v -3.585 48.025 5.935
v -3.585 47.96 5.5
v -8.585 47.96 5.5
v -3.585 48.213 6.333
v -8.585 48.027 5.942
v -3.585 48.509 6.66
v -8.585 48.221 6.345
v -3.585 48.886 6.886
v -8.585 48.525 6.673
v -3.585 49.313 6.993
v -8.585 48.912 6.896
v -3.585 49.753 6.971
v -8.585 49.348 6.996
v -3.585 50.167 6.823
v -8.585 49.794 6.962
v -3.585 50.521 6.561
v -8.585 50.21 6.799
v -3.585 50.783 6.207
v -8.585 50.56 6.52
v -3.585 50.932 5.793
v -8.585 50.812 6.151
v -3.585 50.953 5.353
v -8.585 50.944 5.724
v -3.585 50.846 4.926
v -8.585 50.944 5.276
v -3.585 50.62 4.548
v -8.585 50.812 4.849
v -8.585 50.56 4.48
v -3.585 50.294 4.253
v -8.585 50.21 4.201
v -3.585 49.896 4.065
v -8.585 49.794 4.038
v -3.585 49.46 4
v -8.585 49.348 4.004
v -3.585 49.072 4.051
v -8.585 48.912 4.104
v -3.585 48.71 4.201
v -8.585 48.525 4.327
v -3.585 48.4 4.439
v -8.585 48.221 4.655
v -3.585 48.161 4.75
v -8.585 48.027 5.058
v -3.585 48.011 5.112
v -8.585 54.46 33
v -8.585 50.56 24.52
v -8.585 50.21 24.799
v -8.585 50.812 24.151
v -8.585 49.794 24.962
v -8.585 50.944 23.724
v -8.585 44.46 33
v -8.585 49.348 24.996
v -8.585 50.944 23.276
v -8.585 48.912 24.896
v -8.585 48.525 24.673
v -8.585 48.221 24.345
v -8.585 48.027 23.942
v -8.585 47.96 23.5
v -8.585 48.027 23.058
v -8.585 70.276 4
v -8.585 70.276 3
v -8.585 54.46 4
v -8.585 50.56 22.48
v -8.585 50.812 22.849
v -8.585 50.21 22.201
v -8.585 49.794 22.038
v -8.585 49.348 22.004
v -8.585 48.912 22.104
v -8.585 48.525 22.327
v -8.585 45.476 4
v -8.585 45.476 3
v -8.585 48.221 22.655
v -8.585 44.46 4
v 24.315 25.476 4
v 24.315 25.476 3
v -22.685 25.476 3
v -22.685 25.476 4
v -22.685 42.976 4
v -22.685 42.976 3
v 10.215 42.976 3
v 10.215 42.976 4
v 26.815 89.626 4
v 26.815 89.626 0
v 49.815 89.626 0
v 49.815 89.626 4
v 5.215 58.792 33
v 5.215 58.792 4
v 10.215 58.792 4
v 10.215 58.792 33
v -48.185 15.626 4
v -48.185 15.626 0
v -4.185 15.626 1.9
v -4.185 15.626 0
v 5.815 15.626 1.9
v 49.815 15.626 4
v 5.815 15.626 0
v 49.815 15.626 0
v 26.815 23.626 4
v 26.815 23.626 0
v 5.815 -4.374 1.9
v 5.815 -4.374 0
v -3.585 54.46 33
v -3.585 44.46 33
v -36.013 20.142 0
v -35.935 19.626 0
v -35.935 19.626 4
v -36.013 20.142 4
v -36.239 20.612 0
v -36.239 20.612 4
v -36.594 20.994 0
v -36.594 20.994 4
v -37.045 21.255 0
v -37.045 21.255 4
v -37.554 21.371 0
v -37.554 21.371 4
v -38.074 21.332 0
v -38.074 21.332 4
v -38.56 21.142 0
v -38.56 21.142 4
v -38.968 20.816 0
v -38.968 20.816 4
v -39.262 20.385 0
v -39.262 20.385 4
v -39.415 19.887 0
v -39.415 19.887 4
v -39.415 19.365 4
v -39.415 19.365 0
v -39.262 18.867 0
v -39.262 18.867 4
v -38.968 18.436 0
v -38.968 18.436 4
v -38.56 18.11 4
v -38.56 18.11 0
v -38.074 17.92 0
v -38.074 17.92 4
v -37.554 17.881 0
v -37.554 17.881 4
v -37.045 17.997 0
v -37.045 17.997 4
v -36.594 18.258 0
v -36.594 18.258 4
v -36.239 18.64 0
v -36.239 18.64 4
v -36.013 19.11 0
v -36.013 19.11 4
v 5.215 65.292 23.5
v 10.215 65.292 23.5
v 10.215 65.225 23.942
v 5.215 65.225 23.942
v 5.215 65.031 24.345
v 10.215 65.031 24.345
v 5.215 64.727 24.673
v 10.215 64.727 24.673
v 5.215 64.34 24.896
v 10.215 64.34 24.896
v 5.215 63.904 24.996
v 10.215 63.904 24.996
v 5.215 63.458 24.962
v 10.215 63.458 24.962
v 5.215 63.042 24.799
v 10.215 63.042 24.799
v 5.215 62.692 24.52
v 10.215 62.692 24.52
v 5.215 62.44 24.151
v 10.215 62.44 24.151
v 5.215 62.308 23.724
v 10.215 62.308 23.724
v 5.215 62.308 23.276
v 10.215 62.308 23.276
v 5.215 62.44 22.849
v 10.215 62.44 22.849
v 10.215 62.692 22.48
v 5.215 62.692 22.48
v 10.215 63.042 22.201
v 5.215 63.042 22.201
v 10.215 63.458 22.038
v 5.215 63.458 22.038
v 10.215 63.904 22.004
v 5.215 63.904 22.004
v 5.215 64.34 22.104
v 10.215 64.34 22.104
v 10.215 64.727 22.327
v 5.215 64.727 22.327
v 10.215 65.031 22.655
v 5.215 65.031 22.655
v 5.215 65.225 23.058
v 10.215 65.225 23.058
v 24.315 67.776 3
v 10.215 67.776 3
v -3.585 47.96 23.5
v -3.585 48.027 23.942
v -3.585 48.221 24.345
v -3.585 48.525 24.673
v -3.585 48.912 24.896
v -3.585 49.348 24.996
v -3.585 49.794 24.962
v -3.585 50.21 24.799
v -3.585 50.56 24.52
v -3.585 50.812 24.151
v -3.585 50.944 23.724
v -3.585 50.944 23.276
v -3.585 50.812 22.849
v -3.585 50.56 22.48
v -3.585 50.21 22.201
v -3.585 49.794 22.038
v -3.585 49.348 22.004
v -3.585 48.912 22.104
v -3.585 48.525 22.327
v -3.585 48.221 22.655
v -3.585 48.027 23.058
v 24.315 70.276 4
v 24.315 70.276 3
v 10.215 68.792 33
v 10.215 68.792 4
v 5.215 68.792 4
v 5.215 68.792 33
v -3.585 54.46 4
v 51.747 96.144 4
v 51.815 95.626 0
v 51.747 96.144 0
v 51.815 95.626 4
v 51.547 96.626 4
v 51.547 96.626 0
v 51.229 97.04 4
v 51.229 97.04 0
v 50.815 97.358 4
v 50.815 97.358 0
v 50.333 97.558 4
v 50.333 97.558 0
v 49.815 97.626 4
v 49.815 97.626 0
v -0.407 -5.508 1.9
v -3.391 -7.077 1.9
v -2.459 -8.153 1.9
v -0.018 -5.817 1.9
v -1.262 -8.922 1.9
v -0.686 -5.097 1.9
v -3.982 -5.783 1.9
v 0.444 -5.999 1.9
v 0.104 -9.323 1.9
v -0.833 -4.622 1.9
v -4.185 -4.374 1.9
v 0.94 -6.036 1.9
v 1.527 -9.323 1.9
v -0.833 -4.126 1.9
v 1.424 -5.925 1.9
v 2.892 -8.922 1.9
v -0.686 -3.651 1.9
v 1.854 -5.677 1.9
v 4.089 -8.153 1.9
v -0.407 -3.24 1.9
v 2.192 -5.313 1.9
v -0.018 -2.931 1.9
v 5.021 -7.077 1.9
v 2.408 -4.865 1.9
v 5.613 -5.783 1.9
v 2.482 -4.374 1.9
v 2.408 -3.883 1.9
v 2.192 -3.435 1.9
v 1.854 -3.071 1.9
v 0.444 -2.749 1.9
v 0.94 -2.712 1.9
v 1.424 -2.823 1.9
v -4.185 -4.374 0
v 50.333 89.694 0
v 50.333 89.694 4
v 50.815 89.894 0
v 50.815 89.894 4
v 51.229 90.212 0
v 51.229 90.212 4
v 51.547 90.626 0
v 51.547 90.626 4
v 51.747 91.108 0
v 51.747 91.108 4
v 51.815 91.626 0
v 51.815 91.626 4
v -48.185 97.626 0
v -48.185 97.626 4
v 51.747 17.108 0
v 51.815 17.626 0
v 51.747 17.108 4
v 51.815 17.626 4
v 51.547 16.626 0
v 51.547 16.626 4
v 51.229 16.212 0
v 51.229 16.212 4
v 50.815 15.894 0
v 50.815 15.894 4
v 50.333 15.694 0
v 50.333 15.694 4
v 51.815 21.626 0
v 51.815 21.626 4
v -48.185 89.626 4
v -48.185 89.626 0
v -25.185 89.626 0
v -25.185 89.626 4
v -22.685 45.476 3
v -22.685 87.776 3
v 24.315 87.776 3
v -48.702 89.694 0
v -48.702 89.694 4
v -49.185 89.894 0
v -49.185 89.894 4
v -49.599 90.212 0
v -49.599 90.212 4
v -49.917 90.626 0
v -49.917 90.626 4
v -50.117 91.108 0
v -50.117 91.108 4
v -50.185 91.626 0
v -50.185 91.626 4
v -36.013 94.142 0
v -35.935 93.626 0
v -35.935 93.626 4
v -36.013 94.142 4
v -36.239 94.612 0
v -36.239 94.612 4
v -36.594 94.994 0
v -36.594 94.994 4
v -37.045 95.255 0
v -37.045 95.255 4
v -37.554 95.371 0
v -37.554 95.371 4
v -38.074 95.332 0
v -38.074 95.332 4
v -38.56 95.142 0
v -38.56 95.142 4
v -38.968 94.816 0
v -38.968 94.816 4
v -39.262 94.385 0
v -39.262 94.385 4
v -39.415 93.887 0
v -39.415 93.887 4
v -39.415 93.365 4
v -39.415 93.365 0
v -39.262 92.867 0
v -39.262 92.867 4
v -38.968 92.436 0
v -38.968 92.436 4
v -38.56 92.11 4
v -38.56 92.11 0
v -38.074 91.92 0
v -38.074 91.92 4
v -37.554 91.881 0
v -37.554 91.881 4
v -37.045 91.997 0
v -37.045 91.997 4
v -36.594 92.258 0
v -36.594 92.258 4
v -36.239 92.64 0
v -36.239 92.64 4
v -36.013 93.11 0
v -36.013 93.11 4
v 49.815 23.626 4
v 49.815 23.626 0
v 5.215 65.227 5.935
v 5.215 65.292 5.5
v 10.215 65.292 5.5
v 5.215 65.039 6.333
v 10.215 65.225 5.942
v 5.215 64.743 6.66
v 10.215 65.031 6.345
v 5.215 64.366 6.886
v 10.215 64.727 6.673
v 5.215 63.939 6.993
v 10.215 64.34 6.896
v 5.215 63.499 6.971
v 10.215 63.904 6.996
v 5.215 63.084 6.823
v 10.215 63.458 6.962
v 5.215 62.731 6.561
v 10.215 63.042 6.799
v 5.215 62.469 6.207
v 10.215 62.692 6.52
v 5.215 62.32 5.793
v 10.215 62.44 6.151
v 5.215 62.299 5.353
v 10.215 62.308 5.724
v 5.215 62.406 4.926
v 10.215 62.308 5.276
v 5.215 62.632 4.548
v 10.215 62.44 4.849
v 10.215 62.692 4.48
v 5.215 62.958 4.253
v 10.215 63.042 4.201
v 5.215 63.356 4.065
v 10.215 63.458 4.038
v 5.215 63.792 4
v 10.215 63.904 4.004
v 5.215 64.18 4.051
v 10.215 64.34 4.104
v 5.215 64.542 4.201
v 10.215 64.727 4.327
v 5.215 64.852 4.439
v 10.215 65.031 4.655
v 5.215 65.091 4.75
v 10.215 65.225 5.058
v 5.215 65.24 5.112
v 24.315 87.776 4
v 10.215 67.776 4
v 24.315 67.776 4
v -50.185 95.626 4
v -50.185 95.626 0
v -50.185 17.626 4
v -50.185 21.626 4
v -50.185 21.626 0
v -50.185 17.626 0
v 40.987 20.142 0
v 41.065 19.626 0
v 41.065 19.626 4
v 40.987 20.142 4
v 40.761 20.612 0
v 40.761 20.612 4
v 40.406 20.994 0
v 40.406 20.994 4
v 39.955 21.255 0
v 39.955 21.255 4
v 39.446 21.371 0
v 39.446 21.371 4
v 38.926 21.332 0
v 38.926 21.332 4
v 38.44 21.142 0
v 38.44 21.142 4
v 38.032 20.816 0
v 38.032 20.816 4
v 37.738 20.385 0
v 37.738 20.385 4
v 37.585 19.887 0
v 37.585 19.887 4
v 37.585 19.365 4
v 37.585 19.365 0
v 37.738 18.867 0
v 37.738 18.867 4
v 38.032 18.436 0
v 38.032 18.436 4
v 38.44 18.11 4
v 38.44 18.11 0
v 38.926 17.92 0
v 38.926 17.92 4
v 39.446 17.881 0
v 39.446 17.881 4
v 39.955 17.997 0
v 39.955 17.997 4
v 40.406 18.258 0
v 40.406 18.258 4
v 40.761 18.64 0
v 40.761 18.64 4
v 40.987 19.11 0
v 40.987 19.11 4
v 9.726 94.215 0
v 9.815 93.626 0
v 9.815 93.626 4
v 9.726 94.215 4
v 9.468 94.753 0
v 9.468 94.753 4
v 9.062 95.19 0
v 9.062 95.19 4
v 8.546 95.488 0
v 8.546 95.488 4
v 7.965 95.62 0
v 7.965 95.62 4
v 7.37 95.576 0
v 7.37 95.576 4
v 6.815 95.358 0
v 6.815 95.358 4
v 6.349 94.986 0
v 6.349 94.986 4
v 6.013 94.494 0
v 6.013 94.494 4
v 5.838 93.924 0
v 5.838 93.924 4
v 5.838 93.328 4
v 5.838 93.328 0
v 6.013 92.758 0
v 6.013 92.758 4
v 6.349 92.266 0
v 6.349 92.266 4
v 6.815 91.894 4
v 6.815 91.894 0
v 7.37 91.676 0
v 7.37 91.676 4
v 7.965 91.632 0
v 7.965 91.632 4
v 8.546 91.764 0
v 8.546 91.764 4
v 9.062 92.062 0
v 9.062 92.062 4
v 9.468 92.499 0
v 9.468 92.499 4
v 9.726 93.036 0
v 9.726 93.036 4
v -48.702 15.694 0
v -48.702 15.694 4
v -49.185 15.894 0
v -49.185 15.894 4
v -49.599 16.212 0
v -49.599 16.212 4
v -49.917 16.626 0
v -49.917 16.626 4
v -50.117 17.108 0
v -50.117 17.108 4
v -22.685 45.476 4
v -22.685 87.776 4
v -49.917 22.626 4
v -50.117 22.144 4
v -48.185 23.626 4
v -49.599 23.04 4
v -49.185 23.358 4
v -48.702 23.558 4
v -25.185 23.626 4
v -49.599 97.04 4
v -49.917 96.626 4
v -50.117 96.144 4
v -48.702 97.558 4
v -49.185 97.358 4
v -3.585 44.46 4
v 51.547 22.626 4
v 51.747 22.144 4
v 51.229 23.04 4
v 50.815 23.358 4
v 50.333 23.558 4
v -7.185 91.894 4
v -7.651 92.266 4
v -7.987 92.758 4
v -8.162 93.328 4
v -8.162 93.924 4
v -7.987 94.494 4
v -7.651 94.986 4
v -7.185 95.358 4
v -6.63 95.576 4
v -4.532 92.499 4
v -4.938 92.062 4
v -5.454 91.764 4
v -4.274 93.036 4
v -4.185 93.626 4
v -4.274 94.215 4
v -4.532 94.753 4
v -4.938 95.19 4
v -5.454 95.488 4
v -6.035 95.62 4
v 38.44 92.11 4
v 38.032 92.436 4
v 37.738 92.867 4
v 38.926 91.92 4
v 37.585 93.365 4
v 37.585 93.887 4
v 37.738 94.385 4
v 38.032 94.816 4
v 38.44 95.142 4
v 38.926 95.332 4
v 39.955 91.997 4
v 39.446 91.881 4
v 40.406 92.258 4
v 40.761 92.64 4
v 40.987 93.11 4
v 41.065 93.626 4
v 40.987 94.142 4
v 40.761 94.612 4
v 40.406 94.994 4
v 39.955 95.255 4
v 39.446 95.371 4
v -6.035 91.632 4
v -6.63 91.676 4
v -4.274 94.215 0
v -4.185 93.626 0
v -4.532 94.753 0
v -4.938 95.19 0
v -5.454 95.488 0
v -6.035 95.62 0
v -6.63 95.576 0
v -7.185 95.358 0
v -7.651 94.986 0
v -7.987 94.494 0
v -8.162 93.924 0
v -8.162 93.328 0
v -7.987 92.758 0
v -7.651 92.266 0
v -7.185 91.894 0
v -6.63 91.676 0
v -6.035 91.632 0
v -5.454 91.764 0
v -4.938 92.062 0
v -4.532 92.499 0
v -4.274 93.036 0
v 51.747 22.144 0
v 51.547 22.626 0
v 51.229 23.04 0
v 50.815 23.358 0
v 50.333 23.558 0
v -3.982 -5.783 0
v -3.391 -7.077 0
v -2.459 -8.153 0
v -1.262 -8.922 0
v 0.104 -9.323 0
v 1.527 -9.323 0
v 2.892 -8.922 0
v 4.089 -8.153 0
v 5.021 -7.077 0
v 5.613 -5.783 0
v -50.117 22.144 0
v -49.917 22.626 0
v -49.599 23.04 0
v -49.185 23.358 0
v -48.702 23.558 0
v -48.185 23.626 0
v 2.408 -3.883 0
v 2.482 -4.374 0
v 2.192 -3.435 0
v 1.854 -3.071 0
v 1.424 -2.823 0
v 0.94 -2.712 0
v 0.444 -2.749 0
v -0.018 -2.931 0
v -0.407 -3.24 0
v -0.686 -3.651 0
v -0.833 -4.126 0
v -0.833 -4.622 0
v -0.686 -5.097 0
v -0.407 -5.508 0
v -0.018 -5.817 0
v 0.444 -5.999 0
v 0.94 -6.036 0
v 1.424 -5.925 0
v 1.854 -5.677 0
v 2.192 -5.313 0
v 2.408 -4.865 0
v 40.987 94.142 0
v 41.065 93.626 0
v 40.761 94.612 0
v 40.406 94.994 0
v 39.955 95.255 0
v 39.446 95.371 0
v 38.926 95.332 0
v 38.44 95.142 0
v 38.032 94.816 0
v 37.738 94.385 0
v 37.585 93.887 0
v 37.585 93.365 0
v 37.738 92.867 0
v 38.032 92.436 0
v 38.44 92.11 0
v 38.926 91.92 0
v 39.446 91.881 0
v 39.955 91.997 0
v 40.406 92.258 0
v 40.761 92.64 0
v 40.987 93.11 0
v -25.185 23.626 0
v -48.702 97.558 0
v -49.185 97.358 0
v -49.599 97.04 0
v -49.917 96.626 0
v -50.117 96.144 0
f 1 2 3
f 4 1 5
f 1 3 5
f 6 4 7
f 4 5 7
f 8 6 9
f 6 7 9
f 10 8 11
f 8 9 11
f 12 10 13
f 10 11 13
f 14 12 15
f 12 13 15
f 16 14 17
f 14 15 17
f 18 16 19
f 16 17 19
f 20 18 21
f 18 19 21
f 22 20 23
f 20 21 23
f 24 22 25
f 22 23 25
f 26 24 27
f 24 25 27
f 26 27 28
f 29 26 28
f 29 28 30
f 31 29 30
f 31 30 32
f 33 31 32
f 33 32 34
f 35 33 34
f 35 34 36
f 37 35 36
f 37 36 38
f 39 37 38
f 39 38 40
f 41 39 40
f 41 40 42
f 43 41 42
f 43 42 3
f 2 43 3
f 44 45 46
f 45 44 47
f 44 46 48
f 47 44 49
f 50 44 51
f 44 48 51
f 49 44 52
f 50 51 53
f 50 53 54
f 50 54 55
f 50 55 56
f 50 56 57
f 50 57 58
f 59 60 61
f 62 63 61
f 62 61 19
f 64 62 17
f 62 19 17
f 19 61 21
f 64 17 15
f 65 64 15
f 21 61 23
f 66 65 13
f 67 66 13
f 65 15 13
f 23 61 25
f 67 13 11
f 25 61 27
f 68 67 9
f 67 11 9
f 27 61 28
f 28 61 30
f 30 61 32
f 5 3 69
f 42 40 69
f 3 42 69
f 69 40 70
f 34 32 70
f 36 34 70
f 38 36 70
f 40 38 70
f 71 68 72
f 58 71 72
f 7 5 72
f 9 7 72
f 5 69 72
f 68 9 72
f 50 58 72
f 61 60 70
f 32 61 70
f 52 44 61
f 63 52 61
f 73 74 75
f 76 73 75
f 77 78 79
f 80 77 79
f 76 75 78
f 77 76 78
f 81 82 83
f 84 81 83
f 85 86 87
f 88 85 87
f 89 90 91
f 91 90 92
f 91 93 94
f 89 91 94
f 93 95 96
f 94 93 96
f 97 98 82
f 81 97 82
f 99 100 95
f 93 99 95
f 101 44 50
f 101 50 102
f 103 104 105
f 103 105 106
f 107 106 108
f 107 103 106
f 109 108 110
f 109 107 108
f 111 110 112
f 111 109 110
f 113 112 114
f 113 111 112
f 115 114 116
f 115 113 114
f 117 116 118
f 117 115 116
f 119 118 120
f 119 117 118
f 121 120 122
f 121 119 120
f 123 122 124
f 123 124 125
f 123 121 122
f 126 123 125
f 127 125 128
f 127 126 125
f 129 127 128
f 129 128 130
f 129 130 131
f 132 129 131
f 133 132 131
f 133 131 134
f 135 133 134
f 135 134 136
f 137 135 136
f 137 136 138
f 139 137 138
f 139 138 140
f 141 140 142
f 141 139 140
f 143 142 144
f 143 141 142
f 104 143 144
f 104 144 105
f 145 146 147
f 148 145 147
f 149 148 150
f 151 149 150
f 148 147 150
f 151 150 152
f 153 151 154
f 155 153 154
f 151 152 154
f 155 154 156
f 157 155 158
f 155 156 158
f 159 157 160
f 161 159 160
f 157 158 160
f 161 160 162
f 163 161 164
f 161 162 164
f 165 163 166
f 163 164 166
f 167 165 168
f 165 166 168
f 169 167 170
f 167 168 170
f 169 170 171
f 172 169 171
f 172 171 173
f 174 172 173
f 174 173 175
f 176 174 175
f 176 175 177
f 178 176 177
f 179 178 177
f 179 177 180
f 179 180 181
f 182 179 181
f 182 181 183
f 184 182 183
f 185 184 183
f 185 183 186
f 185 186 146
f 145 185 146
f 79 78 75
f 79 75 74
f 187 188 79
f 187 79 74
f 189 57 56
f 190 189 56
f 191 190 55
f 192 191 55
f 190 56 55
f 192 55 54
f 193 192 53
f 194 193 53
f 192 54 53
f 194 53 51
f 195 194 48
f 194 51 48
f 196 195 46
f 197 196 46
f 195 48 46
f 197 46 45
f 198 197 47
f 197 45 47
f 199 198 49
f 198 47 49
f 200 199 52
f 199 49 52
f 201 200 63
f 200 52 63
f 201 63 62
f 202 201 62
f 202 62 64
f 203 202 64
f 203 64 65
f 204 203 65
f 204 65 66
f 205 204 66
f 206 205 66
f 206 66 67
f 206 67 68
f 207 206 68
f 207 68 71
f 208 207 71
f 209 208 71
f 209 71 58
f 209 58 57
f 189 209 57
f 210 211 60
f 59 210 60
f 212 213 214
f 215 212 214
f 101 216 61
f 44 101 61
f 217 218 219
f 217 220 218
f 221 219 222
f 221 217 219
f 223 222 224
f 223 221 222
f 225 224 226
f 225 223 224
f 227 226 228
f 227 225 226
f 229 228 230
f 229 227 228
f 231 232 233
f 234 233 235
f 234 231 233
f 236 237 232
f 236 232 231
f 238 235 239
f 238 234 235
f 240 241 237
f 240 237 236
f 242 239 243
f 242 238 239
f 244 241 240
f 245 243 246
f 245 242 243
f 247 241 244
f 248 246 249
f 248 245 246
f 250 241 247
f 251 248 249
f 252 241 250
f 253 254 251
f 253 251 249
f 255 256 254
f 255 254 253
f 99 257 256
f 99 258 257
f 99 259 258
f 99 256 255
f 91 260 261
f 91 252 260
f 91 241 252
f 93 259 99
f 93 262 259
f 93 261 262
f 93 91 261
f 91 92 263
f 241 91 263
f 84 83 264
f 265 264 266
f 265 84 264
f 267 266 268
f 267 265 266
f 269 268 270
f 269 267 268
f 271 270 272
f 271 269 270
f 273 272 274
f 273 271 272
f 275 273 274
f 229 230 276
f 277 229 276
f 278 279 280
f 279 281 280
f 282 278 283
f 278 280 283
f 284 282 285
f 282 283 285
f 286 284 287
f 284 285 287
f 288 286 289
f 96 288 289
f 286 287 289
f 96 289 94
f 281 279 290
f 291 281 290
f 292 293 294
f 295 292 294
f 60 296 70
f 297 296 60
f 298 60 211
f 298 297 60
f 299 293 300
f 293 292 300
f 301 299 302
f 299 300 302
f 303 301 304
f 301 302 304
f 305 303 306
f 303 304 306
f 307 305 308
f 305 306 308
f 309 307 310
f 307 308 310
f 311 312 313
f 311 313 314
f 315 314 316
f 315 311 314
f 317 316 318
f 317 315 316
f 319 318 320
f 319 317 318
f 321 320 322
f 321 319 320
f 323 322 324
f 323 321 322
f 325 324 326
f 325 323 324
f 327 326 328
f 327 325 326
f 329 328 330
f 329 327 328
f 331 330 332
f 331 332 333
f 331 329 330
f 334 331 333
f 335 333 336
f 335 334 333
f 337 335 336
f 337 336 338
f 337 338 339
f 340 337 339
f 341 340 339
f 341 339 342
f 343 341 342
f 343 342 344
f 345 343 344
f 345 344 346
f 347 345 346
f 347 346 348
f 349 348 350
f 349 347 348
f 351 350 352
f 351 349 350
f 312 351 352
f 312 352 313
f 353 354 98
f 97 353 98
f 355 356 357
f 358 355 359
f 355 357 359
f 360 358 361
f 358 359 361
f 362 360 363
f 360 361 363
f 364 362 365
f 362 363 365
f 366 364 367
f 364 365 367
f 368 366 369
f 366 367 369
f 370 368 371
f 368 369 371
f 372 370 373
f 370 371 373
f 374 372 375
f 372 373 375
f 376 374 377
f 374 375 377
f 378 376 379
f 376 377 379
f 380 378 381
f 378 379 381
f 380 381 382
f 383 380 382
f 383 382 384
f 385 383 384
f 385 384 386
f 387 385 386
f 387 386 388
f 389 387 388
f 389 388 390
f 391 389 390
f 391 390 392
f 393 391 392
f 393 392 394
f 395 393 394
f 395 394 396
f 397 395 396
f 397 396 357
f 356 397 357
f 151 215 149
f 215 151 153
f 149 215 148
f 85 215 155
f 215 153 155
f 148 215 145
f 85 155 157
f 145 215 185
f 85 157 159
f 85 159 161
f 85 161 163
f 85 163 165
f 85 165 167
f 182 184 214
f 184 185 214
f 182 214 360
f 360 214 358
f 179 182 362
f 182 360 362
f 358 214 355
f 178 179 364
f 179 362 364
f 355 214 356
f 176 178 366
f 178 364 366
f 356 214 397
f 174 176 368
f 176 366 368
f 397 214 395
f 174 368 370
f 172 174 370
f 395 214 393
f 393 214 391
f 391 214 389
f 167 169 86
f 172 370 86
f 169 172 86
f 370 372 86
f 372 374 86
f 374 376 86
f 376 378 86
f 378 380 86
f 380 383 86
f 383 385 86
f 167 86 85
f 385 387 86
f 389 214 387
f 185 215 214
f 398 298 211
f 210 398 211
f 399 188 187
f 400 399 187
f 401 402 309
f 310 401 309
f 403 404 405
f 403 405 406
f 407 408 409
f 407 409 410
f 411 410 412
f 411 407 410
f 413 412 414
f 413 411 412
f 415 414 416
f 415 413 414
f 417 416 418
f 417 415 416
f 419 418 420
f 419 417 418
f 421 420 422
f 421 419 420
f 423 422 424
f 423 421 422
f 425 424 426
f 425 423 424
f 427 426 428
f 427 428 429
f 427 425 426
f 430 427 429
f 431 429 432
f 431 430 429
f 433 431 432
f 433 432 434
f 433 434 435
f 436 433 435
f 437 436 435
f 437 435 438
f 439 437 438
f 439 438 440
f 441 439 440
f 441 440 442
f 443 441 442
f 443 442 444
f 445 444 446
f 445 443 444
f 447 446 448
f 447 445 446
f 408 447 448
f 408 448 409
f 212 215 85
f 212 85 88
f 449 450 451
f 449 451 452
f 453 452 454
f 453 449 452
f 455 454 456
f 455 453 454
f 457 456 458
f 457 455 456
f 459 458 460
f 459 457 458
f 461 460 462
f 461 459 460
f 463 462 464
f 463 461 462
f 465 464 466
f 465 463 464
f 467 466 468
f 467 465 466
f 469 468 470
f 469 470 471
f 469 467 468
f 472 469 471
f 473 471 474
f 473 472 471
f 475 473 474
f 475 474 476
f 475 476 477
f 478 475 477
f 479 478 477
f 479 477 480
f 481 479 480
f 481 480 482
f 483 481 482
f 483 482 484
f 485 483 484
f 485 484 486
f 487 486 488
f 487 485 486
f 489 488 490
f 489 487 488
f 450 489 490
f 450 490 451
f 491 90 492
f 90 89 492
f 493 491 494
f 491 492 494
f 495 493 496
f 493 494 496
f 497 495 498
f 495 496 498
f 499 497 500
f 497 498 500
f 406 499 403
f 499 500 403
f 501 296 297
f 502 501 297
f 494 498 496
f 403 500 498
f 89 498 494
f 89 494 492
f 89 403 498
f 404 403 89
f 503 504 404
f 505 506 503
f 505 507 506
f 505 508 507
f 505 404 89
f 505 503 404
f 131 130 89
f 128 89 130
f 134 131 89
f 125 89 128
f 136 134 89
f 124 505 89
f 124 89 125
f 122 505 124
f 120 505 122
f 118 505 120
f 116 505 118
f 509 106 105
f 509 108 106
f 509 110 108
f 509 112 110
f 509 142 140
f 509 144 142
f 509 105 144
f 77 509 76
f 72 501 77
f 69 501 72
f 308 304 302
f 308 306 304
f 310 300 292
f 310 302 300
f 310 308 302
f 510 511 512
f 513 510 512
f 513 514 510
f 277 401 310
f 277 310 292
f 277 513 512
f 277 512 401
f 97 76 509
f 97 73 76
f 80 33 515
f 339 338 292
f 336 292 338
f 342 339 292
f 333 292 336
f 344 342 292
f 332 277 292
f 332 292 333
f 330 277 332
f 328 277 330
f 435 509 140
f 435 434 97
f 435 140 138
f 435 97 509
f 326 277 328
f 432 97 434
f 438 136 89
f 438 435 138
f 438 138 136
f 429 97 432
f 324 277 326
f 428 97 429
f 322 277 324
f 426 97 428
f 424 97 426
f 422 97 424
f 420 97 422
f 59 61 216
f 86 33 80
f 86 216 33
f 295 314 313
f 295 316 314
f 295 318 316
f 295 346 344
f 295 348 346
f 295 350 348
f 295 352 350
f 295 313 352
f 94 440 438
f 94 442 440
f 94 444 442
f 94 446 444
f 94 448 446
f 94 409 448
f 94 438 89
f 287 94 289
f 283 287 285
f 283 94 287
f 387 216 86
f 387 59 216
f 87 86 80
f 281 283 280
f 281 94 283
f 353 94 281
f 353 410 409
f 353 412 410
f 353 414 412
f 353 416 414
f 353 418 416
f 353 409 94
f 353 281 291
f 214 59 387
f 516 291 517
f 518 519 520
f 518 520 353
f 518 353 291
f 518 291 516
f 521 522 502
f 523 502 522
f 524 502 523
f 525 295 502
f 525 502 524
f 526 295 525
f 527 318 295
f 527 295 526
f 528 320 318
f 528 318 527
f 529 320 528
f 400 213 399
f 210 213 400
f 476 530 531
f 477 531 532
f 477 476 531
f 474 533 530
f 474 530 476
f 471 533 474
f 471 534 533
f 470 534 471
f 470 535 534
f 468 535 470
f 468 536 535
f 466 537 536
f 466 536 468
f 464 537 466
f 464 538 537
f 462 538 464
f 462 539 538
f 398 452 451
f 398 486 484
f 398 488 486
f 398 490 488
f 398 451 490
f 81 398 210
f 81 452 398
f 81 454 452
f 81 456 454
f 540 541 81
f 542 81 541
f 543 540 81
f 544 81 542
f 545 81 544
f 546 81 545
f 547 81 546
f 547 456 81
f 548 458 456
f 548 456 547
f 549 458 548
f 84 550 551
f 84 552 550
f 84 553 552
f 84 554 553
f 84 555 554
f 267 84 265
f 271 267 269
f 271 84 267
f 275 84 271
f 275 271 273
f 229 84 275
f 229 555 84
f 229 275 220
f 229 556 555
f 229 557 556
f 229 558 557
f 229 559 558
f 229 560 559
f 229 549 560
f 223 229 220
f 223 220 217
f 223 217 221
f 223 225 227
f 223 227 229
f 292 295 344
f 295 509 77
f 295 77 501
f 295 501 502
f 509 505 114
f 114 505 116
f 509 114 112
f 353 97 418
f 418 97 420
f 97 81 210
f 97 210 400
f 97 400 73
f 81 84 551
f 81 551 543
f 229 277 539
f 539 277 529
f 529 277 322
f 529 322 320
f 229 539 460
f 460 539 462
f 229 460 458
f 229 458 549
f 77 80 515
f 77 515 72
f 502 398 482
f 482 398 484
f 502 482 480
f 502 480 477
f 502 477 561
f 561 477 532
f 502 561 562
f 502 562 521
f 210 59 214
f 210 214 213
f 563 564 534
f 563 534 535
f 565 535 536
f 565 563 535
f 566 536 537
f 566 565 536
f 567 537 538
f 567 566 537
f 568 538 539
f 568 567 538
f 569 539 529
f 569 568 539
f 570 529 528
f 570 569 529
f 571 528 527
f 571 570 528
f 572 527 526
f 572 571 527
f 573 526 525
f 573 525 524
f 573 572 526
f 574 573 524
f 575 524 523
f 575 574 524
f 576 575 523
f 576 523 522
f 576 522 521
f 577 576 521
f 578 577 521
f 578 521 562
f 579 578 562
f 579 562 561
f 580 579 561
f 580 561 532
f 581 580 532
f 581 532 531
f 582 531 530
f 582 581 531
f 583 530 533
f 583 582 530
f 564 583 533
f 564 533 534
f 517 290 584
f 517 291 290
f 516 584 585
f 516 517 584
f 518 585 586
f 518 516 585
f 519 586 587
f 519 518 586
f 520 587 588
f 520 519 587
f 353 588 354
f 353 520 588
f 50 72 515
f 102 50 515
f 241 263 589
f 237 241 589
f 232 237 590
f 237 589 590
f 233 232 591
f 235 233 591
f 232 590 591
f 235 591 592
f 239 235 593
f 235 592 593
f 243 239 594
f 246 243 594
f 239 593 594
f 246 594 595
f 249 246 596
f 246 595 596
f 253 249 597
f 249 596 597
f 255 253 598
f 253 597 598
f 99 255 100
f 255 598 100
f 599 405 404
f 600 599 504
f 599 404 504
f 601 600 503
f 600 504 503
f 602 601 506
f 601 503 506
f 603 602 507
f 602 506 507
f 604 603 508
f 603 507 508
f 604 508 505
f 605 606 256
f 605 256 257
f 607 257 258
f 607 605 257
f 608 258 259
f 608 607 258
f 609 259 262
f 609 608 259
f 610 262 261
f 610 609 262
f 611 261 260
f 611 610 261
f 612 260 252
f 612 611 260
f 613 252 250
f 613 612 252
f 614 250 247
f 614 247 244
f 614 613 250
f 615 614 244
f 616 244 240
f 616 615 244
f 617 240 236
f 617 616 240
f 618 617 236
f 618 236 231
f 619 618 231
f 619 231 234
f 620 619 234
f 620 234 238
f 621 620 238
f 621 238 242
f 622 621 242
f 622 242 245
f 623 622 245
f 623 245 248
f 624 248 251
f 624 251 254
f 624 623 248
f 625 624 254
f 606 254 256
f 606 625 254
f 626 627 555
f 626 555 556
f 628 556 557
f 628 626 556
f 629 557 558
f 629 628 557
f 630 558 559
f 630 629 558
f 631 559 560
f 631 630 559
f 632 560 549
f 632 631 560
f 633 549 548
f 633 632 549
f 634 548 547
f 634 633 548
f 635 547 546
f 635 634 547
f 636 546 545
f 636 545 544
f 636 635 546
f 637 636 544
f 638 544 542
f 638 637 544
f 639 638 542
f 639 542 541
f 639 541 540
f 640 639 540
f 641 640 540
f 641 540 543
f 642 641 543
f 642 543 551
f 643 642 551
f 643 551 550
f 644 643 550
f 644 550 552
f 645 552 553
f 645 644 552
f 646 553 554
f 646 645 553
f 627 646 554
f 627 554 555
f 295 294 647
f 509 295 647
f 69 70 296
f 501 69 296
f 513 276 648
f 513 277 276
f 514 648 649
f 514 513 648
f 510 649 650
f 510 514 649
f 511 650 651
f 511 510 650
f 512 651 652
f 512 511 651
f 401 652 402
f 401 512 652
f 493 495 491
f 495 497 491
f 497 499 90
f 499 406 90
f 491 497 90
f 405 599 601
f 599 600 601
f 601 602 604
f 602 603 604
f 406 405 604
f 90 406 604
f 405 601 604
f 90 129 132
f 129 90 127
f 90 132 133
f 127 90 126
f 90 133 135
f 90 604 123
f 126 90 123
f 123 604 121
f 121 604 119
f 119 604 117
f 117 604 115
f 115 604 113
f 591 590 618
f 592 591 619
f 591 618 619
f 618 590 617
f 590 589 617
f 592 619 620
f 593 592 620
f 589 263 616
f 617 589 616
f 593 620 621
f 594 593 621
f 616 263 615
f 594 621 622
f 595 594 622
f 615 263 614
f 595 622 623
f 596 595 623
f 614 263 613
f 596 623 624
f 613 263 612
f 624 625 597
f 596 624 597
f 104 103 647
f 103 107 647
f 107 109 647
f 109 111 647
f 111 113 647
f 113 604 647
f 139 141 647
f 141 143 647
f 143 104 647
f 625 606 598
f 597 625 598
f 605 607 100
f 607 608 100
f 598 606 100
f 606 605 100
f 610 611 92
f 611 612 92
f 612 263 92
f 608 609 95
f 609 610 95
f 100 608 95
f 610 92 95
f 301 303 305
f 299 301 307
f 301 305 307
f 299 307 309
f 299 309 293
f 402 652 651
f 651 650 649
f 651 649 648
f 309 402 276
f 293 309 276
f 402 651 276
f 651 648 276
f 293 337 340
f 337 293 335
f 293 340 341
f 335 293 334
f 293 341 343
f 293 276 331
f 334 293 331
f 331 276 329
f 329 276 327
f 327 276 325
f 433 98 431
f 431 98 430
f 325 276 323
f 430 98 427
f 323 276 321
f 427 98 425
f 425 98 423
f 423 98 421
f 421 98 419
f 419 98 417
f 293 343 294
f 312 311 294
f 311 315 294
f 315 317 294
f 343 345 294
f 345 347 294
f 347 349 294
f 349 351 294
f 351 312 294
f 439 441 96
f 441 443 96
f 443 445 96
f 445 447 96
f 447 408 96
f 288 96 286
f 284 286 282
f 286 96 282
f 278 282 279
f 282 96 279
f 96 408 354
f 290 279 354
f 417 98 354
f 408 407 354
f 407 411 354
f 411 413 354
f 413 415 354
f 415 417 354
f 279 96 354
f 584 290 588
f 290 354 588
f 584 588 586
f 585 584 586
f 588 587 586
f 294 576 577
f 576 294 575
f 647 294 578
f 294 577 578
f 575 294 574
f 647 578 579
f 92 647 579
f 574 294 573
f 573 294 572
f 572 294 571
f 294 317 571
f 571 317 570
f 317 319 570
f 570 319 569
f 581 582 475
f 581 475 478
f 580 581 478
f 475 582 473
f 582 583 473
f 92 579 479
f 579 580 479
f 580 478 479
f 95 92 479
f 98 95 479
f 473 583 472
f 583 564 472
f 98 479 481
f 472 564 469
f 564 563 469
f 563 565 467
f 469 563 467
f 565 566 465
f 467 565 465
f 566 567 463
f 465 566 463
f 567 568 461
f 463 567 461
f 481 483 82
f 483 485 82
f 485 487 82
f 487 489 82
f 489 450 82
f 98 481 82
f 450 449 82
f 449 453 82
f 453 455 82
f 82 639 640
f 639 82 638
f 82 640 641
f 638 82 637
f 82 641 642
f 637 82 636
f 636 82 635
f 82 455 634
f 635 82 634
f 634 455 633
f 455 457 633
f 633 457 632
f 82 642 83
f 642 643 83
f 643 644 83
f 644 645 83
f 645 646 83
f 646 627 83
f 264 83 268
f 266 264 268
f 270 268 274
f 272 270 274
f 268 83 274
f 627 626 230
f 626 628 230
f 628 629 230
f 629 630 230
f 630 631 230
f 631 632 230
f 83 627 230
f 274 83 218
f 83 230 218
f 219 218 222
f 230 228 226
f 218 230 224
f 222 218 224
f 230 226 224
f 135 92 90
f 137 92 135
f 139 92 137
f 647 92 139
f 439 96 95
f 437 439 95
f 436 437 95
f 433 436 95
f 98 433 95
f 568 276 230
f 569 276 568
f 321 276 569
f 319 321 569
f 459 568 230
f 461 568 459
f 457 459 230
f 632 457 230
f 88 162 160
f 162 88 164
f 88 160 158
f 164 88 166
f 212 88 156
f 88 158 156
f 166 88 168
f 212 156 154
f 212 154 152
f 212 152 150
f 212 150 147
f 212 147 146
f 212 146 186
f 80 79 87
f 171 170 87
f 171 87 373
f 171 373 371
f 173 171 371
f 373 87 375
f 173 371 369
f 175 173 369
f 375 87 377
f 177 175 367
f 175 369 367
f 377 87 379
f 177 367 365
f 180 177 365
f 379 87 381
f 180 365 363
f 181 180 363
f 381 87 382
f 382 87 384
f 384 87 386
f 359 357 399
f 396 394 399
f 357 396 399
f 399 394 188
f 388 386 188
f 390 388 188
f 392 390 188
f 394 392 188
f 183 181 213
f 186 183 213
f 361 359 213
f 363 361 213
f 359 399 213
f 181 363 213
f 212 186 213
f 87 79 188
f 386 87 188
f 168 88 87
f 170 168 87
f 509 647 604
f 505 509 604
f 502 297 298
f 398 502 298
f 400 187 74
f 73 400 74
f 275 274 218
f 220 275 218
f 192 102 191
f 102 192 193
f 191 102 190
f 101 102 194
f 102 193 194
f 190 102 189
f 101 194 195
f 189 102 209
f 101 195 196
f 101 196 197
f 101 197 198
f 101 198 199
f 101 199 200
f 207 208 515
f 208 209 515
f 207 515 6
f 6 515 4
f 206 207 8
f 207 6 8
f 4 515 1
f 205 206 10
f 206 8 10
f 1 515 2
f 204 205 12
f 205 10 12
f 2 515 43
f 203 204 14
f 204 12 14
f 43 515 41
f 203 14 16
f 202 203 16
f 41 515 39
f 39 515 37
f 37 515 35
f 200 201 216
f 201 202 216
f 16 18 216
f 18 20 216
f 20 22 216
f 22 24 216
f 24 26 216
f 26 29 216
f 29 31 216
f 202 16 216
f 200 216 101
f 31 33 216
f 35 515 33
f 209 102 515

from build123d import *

# Parameters (mm, degrees)
F0_R      = 1.75
F0_R_2    = 2
F1_DEPTH  = 4
F2_DEPTH  = 3
F0_R_3    = 1.6666666667
F3_DEPTH  = 1.9
F4_DEPTH  = 33
F5_R      = 2
F9_R      = 1.5
F10_DEPTH = 25
F8_R      = 1.5
F11_DEPTH = 25


with BuildPart() as f1:
    # F0 (on Top) → F1 (new body)
    with BuildSketch(Plane.XY):
        Polygon((26.8151908007, 97.6259698881), (-25.1848091993, 97.6259698881), (-50.1848091993, 97.6259698881), (-50.1848091993, 89.6259698881), (-25.1848091993, 89.6259698881), (-25.1848091993, 23.6259698881), (-50.1848091993, 23.6259698881), (-50.1848091993, 15.6259698881), (-25.1848091993, 15.6259698881), (-4.1848091993, 15.6259698881), (5.8151908007, 15.6259698881), (26.8151908007, 15.6259698881), (51.8151908007, 15.6259698881), (51.8151908007, 23.6259698881), (26.8151908007, 23.6259698881), (26.8151908007, 89.6259698881), (51.8151908007, 89.6259698881), (51.8151908007, 97.6259698881), align=None)
        with Locations((-37.6848091993, 19.6259698881)):
            Circle(F0_R, mode=Mode.SUBTRACT)
        with Locations((39.3151908007, 19.6259698881)):
            Circle(F0_R, mode=Mode.SUBTRACT)
        with Locations((-37.6848091993, 93.6259698881)):
            Circle(F0_R, mode=Mode.SUBTRACT)
        with Locations((-6.1848091993, 93.6259698881)):
            Circle(F0_R_2, mode=Mode.SUBTRACT)
        Polygon((10.2151908007, 67.7759698881), (24.3151908007, 67.7759698881), (24.3151908007, 25.4759698881), (-22.6848091993, 25.4759698881), (-22.6848091993, 42.9759698881), (10.2151908007, 42.9759698881), (10.2151908007, 58.7915498881), (5.2151908007, 58.7915498881), (5.2151908007, 68.7915498881), (10.2151908007, 68.7915498881), align=None, mode=Mode.SUBTRACT)
        Polygon((24.3151908007, 70.2759698881), (10.2151908007, 70.2759698881), (7.2151908007, 70.2759698881), (-8.5848091993, 70.2759698881), (-8.5848091993, 54.4603863134), (-3.5848091993, 54.4603863134), (-3.5848091993, 44.4603863134), (-8.5848091993, 44.4603863134), (-8.5848091993, 45.4759698881), (-22.6848091993, 45.4759698881), (-22.6848091993, 87.7759698881), (24.3151908007, 87.7759698881), align=None, mode=Mode.SUBTRACT)
        with Locations((7.8151908007, 93.6259698881)):
            Circle(F0_R_2, mode=Mode.SUBTRACT)
        with Locations((39.3151908007, 93.6259698881)):
            Circle(F0_R, mode=Mode.SUBTRACT)
    extrude(amount=F1_DEPTH)

    # F0 (on Top) → F2 (join)
    with BuildSketch(Plane.XY):
        Polygon((24.3151908007, 25.4759698881), (24.3151908007, 67.7759698881), (10.2151908007, 67.7759698881), (10.2151908007, 61.4111642682), (10.2151908007, 58.7915498881), (10.2151908007, 42.9759698881), (-22.6848091993, 42.9759698881), (-22.6848091993, 25.4759698881), align=None)
        Polygon((7.2151908007, 70.2759698881), (10.2151908007, 70.2759698881), (24.3151908007, 70.2759698881), (24.3151908007, 87.7759698881), (-22.6848091993, 87.7759698881), (-22.6848091993, 45.4759698881), (-8.5848091993, 45.4759698881), (-8.5848091993, 54.4603863134), (-8.5848091993, 70.2759698881), align=None)
    extrude(amount=F2_DEPTH)

    # F0 (on Top) → F3 (join)
    with BuildSketch(Plane.XY):
        with BuildLine():
            Line((5.8151908007, 15.6259698881), (-4.1848091993, 15.6259698881))
            Line((-4.1848091993, 15.6259698881), (-4.1848091993, -4.3740301119))
            ThreePointArc((-4.1848091993, -4.3740301119), (0.8151908007, -9.3740301119), (5.8151908007, -4.3740301119))
            Line((5.8151908007, -4.3740301119), (5.8151908007, 15.6259698881))
        make_face()
        with Locations((0.8151908007, -4.3740301119)):
            Circle(F0_R_3, mode=Mode.SUBTRACT)
    extrude(amount=F3_DEPTH)

    # F0 (on Top) → F4 (join)
    with BuildSketch(Plane.XY):
        Polygon((10.2151908007, 61.4111642682), (10.2151908007, 67.7759698881), (10.2151908007, 68.7915498881), (5.2151908007, 68.7915498881), (5.2151908007, 58.7915498881), (10.2151908007, 58.7915498881), align=None)
        Polygon((-3.5848091993, 54.4603863134), (-8.5848091993, 54.4603863134), (-8.5848091993, 45.4759698881), (-8.5848091993, 44.4603863134), (-3.5848091993, 44.4603863134), align=None)
    extrude(amount=F4_DEPTH)

    # F5
    f5_edges = [f1.edges().sort_by_distance(p)[0] for p in [
        (51.815191, 97.62597, 2),
        (-50.184809, 97.62597, 2),
        (-50.184809, 89.62597, 2),
        (-50.184809, 15.62597, 2),
        (51.815191, 23.62597, 2),
        (51.815191, 15.62597, 2),
        (51.815191, 89.62597, 2),
        (-50.184809, 23.62597, 2),
    ]]
    fillet(f5_edges, radius=F5_R)

    # F9 (on offset) → F10 (cut)
    with BuildSketch(Plane(origin=(-8.5848091993, 0, 0), x_dir=(0, -1, 0), z_dir=(-1, 0, 0))):
        with Locations((-49.4603863134, 23.5)):
            Circle(F9_R)
        with Locations((-49.4603863134, 5.5)):
            Circle(F9_R)
    extrude(amount=-F10_DEPTH, mode=Mode.SUBTRACT)

    # F8 (on offset) → F11 (cut)
    with BuildSketch(Plane.YZ.offset(10.2151908007)):
        with Locations((63.7915498881, 5.5)):
            Circle(F8_R)
        with Locations((63.7915498881, 23.5)):
            Circle(F8_R)
    extrude(amount=-F11_DEPTH, mode=Mode.SUBTRACT)


solid = f1.part
